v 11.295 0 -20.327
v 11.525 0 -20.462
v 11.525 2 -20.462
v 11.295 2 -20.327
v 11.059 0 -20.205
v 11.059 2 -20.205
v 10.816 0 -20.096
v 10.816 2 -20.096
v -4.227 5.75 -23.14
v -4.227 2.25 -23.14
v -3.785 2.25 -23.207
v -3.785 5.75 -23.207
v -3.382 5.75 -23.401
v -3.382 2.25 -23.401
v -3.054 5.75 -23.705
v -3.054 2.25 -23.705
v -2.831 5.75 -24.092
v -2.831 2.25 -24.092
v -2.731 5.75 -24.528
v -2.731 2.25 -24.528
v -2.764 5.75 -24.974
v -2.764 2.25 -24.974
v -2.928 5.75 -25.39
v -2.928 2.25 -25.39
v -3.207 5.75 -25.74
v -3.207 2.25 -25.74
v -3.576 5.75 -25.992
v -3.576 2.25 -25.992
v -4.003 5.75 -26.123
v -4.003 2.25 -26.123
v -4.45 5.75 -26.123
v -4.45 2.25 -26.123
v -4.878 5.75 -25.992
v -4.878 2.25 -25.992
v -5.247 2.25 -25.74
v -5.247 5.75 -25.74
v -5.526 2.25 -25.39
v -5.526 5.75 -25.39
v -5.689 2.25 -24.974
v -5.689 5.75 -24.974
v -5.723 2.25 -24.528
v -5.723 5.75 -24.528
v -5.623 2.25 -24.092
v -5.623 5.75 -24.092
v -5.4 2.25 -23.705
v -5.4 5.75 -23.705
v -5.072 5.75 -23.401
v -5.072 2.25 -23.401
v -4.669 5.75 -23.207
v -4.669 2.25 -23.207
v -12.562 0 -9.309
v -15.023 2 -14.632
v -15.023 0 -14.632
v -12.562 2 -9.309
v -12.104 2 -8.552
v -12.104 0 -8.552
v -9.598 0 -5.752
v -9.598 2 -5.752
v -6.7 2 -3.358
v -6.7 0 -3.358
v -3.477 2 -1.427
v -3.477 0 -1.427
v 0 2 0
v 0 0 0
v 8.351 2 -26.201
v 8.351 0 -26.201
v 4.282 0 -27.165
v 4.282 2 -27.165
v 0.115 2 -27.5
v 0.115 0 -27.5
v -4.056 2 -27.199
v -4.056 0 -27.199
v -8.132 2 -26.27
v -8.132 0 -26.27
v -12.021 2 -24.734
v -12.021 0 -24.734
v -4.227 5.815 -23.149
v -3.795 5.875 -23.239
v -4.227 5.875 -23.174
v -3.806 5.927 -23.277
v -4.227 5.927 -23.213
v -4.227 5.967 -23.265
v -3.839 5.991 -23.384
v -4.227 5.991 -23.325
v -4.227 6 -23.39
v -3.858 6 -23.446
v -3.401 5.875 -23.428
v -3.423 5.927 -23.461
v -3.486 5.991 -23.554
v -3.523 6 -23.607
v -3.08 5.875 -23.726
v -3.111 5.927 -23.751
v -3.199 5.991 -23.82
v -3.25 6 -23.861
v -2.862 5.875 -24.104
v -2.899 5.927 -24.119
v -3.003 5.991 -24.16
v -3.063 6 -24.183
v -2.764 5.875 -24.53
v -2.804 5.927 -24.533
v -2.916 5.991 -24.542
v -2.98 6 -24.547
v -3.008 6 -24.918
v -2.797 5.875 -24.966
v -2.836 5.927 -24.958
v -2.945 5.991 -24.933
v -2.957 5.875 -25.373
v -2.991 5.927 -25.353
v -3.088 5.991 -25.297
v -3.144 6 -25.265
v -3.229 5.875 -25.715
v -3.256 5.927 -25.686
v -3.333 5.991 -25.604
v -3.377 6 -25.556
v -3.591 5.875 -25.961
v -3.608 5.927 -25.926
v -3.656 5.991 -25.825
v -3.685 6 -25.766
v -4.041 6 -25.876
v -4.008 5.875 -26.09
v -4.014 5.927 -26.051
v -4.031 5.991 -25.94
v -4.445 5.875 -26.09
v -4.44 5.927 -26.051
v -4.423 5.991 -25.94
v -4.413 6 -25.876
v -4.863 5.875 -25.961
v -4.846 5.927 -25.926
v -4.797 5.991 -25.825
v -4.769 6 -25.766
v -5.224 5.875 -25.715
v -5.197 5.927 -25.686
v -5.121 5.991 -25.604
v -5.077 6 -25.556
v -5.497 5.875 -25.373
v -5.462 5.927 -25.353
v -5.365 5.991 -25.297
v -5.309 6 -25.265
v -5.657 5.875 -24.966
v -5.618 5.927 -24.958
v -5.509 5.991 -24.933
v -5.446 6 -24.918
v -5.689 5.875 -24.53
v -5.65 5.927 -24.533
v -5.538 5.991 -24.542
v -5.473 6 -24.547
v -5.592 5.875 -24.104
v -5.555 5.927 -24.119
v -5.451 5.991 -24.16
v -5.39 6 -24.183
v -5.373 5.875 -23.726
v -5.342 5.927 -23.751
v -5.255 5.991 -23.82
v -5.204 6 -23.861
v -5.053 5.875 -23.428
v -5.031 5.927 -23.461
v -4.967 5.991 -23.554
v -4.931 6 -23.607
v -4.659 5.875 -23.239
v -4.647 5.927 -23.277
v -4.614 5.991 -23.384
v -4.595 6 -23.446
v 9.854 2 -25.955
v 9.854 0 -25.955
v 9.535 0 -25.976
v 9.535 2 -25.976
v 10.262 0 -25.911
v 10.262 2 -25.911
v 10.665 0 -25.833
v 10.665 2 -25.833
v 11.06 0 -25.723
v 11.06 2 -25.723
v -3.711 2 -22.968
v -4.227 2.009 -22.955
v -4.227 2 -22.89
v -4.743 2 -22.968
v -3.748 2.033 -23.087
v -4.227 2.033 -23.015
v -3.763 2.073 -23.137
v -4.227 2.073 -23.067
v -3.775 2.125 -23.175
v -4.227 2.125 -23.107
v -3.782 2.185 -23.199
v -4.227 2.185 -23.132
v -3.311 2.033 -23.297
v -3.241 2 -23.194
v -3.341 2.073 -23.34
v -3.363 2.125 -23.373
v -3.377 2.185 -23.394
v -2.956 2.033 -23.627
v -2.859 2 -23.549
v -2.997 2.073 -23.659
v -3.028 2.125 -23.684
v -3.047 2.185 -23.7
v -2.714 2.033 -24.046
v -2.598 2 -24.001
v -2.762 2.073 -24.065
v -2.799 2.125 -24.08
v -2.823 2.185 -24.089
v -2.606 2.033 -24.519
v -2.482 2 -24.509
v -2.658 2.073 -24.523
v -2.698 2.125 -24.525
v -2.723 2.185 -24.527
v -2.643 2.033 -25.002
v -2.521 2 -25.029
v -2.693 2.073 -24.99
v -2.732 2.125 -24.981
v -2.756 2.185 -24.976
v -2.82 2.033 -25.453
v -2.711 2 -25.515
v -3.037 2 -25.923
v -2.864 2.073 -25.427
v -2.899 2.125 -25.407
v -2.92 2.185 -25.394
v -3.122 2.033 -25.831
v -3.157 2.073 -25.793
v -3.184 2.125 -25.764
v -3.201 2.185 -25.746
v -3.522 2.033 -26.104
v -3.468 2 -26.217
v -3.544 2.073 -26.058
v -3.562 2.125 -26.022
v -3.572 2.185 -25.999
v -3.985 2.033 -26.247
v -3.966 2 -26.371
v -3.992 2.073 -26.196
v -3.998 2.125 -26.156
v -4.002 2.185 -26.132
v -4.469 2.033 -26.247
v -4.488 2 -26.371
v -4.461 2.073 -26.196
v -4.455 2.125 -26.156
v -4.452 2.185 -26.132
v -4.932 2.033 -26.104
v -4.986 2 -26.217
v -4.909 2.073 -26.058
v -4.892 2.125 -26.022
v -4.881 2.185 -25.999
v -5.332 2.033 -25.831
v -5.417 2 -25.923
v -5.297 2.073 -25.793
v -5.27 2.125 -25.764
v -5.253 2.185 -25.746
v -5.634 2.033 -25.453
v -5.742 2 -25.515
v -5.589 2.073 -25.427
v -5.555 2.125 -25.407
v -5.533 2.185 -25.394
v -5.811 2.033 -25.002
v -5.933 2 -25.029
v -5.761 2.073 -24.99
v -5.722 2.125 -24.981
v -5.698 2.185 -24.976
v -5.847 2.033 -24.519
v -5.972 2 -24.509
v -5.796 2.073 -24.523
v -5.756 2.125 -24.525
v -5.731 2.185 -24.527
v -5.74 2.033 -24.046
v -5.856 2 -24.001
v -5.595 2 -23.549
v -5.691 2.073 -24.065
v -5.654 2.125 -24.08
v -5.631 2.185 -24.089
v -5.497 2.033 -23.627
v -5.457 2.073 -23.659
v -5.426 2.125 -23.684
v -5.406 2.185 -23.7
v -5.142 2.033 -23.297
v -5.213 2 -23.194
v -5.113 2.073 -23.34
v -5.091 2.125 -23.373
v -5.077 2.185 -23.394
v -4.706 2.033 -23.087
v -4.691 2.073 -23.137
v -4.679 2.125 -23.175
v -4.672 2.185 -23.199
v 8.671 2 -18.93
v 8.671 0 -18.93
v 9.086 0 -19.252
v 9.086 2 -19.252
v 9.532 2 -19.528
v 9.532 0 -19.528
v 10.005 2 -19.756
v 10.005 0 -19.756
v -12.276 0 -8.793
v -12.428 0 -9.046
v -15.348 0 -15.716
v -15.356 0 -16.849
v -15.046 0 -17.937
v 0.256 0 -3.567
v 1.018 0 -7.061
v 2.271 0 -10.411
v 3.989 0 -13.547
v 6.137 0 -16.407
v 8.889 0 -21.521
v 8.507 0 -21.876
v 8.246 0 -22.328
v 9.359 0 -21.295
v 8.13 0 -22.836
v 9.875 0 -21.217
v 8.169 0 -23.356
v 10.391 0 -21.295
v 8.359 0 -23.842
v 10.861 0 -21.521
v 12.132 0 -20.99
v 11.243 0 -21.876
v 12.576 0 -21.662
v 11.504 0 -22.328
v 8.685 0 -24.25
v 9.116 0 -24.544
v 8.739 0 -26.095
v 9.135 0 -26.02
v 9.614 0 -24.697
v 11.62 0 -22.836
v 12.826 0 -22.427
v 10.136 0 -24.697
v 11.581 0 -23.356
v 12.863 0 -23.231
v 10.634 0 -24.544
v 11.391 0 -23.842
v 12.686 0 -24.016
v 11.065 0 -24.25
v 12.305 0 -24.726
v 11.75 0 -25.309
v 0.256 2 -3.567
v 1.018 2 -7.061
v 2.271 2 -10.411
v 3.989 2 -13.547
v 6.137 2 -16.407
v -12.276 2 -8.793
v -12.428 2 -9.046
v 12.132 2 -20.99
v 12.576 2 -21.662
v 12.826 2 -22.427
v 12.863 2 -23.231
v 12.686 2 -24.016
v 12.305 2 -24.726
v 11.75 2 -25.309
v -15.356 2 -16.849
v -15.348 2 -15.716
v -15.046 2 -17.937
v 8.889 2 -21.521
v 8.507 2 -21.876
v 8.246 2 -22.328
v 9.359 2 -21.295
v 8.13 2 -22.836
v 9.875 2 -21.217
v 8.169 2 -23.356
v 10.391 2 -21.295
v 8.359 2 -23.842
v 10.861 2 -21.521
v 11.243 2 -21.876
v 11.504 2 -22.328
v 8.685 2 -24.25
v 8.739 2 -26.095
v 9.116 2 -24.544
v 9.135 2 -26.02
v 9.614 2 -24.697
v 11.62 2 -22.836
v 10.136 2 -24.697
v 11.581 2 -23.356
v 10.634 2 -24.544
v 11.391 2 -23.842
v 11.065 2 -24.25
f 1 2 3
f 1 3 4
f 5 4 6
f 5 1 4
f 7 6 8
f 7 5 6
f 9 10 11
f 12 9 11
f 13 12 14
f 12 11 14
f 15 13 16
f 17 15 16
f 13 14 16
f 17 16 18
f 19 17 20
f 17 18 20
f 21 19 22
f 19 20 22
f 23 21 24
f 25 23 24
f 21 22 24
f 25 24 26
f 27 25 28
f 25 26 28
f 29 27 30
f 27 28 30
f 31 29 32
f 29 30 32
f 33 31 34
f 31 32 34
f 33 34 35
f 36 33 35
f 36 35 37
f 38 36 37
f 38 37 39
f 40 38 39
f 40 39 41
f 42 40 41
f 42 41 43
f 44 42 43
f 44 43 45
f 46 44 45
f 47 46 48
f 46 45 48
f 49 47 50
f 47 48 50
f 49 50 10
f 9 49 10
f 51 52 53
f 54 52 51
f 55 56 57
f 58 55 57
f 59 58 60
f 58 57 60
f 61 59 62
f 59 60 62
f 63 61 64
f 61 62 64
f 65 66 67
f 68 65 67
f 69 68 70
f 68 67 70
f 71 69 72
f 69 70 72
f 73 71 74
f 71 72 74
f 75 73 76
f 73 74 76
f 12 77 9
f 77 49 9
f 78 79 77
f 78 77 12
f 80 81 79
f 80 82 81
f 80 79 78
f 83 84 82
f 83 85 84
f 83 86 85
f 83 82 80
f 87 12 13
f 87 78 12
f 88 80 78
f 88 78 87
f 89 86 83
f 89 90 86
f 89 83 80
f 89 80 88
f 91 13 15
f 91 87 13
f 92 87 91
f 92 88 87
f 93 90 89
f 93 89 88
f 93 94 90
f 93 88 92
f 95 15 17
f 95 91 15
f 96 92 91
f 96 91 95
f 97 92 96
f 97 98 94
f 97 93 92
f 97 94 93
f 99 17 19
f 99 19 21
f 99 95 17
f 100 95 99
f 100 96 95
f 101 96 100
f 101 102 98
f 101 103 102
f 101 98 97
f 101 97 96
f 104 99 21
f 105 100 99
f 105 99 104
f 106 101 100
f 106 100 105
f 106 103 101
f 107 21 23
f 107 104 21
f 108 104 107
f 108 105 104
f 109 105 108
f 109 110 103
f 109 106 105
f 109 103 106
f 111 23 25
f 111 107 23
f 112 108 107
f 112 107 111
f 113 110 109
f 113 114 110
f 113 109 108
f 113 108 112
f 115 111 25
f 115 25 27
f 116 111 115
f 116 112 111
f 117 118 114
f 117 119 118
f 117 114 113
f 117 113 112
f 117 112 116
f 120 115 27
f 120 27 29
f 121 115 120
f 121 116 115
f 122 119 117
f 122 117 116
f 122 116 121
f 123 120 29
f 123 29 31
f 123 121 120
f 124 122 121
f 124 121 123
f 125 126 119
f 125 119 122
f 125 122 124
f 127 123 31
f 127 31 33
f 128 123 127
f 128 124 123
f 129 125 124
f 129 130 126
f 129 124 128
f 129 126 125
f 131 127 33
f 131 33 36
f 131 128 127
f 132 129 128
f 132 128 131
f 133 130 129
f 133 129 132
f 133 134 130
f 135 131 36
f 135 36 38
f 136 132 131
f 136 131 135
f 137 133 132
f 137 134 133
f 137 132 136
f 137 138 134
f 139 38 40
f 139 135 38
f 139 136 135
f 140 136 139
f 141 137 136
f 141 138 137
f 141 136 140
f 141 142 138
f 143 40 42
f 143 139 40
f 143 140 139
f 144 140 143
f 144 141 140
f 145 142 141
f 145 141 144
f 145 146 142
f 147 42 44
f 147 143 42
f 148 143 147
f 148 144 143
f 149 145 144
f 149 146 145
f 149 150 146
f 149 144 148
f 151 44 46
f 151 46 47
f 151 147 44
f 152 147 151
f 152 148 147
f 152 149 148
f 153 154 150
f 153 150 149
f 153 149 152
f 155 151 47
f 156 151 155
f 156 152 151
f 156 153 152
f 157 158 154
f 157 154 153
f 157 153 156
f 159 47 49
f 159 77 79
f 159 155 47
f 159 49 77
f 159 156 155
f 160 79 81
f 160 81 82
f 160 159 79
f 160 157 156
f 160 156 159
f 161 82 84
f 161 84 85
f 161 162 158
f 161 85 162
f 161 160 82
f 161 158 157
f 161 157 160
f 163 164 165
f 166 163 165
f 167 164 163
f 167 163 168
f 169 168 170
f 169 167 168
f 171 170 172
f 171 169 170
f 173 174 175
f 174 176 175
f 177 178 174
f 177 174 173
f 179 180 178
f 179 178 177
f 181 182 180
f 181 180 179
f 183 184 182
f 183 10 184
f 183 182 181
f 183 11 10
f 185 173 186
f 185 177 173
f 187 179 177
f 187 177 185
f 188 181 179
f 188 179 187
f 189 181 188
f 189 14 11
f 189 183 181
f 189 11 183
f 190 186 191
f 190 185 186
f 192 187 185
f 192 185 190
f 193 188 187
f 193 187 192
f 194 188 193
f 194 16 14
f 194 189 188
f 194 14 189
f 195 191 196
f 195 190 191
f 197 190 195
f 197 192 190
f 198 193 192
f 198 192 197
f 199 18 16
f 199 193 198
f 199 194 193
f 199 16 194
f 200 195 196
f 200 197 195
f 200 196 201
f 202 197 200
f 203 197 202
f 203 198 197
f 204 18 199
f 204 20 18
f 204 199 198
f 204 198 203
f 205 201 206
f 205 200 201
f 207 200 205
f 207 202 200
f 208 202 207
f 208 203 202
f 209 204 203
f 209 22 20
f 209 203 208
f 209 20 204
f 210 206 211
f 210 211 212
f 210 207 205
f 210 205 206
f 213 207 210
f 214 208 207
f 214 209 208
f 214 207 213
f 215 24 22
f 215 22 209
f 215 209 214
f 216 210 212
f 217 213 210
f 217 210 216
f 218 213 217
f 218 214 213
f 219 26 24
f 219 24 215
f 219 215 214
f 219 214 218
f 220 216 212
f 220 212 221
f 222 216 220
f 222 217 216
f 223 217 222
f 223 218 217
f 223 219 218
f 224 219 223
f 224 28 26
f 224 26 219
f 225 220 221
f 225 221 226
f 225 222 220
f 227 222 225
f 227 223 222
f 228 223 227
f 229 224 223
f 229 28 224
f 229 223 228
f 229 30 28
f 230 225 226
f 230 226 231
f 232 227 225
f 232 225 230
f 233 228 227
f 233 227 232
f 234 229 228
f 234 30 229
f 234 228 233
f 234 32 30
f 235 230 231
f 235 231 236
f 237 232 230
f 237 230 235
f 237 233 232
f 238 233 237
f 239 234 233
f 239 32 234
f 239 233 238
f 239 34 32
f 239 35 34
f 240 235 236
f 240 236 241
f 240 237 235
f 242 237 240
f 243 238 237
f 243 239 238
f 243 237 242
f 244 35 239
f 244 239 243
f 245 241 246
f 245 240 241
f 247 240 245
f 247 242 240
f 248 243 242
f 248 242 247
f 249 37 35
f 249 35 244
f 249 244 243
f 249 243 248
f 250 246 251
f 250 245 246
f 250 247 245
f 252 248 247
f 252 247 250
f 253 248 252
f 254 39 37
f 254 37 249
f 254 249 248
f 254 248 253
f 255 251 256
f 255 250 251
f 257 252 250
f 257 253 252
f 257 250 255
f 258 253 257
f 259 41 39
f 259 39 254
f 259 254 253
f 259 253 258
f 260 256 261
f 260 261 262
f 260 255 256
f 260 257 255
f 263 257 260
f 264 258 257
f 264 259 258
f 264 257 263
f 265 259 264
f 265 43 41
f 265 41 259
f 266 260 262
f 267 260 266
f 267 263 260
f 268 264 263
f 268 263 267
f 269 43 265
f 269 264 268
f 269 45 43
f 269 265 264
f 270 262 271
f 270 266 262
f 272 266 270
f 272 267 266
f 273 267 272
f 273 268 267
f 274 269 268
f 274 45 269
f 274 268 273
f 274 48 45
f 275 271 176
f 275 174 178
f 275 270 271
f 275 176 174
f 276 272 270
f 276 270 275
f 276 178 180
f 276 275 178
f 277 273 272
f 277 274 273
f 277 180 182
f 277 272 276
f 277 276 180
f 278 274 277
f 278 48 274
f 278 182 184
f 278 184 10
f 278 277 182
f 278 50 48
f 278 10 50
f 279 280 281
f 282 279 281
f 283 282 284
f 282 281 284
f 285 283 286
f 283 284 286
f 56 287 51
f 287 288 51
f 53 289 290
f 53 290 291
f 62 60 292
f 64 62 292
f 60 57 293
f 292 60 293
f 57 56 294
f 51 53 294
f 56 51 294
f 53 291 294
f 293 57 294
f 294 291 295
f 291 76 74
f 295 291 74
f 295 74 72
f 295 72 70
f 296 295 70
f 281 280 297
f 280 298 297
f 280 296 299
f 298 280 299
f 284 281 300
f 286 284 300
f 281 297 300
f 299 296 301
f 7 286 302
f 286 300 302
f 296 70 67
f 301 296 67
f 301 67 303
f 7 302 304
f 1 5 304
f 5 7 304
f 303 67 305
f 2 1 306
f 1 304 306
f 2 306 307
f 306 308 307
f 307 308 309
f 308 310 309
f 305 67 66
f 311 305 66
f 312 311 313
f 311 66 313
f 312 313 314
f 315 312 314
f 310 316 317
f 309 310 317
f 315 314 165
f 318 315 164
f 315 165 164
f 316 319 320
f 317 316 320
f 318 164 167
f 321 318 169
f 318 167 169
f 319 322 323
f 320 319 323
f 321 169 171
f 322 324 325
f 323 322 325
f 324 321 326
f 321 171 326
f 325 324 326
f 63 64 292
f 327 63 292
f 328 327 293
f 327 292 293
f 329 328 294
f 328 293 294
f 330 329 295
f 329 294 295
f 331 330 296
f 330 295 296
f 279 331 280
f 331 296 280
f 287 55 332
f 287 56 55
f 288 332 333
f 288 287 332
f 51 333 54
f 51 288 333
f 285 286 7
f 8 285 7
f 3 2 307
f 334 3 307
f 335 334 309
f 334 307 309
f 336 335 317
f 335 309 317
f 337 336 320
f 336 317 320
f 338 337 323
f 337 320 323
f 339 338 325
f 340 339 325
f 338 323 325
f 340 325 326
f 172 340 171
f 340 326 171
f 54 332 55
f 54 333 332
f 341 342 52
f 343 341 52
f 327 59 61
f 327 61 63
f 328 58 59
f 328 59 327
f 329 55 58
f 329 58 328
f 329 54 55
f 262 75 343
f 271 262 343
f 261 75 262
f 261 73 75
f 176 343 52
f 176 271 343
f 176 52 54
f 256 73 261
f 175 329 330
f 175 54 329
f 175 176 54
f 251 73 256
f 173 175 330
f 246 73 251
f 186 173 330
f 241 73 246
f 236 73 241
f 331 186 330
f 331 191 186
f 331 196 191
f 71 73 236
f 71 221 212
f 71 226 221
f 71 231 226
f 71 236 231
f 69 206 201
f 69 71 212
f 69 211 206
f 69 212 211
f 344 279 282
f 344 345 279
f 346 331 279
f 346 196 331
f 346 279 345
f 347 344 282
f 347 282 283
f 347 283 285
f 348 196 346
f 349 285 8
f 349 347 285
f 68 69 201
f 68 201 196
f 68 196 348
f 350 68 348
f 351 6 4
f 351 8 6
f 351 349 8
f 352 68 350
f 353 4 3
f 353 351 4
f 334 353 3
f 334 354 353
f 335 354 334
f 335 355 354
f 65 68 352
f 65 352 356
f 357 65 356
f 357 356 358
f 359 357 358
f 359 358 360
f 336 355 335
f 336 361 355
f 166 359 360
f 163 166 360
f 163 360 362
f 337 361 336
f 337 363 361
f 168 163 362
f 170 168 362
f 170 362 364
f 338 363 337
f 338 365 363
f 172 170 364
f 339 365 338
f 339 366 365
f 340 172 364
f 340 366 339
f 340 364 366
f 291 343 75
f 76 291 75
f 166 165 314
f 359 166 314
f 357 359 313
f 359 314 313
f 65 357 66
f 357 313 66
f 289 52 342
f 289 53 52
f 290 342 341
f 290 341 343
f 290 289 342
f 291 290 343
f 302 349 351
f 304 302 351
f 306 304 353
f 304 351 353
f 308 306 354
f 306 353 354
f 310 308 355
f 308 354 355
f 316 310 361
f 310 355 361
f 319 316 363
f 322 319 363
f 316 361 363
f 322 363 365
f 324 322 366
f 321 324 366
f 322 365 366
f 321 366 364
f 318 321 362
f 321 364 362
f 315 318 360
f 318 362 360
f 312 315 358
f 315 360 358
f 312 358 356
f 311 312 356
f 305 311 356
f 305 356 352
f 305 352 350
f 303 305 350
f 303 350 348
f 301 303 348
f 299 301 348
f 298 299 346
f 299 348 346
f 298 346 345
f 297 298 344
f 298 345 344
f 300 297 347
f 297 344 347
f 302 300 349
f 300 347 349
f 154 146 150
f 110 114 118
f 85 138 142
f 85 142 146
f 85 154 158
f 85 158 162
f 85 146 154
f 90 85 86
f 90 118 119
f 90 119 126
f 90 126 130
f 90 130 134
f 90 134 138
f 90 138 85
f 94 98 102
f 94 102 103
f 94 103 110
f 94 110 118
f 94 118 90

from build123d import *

# Parameters (mm, degrees)
BOSS_EXTRUDE1_DEPTH = 2
FILLET1_R           = 2.5
SKETCH2_R           = 1.5
SKETCH2_R_2         = 1.75
CUT_EXTRUDE1_DEPTH  = 2
CUT_EXTRUDE2_REACH  = 34.399
BOSS_EXTRUDE2_START = -2
SKETCH6_R           = 1.5
BOSS_EXTRUDE2_DEPTH = 2
BOSS_EXTRUDE3_START = -2
BOSS_EXTRUDE3_DEPTH = 2
FILLET2_START       = -1
FILLET2_DEPTH       = 4
FILLET2_2_DEPTH     = 2
CUT_EXTRUDE3_DEPTH  = 2
FILLET3_R           = 4
SKETCH11_R          = 1.5
BOSS_EXTRUDE4_DEPTH = 4
FILLET6_R           = 0.25


with BuildPart() as part:
    # Sketch1 → Boss-Extrude1 (new body)
    with BuildSketch(Plane(origin=(0, 0, 0), x_dir=(1, 0, 0), z_dir=(0, 1, 0))):
        with BuildLine():
            ThreePointArc((15.125, 22.967027997), (-1.263298306, 27.470967901), (-17.169059596, 21.48193177))
            ThreePointArc((-17.169059596, 21.48193177), (-11.803604023, 8.168176911), (0, 0))
            ThreePointArc((0, 0), (4.120883639, 13.75), (15.125, 22.967027997))
        make_face()
    extrude(amount=BOSS_EXTRUDE1_DEPTH)

    # Fillet1
    fillet1_edges = [part.edges().sort_by_distance(p)[0] for p in [
        (-17.169059596, 1, -21.48193177),
        (15.125, 1, -22.967027997),
    ]]
    fillet(fillet1_edges, radius=FILLET1_R)

    # Sketch2 → Cut-Extrude1 (cut)
    with BuildSketch(Plane(origin=(0, 2, 0), x_dir=(1, 0, 0), z_dir=(0, 1, 0))):
        with Locations(Location((-4.226868107, 24.640080885, 0), (0, 0, 270))):
            Circle(SKETCH2_R)
        with Locations(Location((9.875, 22.967027997, 0), (0, 0, 270))):
            Circle(SKETCH2_R_2)
    extrude(amount=-CUT_EXTRUDE1_DEPTH, mode=Mode.SUBTRACT)

    # Sketch3 → Cut-Extrude2 (cut, up to next)
    with BuildSketch(Plane(origin=(0, 2, 0), x_dir=(1, 0, 0), z_dir=(0, 1, 0)), mode=Mode.PRIVATE) as cut_extrude2_sk1:
        with BuildLine():
            Line((-15.980917027, 15.838569726), (-12.020745702, 24.733614228))
            ThreePointArc((-12.020745702, 24.733614228), (-14.04148027, 23.645017061), (-15.964394934, 22.391696997))
            ThreePointArc((-15.964394934, 22.391696997), (-16.816313344, 21.328273965), (-16.984031989, 19.976052098))
            ThreePointArc((-16.984031989, 19.976052098), (-16.570708205, 17.885919028), (-15.980917027, 15.838569726))
        make_face()
    cut_extrude2_tool1 = extrude(cut_extrude2_sk1.sketch, amount=-CUT_EXTRUDE2_REACH, mode=Mode.PRIVATE) & part.part
    add(cut_extrude2_tool1.solids().sort_by_distance((-15.061244, 2, -20.693622))[0], mode=Mode.SUBTRACT)

    # Sketch6 → Boss-Extrude2 (add)
    with BuildSketch(Plane.XZ.offset(BOSS_EXTRUDE2_START)):
        with Locations((-4.226868107, -24.640080885)):
            Circle(SKETCH6_R)
    extrude(amount=BOSS_EXTRUDE2_DEPTH)

    # Sketch7 → Boss-Extrude3 (add)
    with BuildSketch(Plane(origin=(0, 2, 0), x_dir=(1, 0, 0), z_dir=(0, 1, 0)).offset(BOSS_EXTRUDE3_START)):
        with BuildLine():
            Line((9.313984882, 19.466610638), (11.248778971, 20.27693074))
            ThreePointArc((11.248778971, 20.27693074), (11.386576571, 20.3697006), (11.525, 20.461534033))
            ThreePointArc((11.525, 20.461534033), (12.863352389, 23.23113025), (11.06, 25.723071356))
            ThreePointArc((11.06, 25.723071356), (10.846265511, 25.813921137), (10.631784841, 25.902995022))
            Line((10.631784841, 25.902995022), (8.903638019, 26.018747665))
            ThreePointArc((8.903638019, 26.018747665), (9.890276319, 25.659938315), (10.8625, 25.263730796))
            ThreePointArc((10.8625, 25.263730796), (12.365293657, 23.187113207), (11.25, 20.879116361))
            ThreePointArc((11.25, 20.879116361), (10.26505719, 20.196075371), (9.313984882, 19.466610638))
        make_face()
    extrude(amount=BOSS_EXTRUDE3_DEPTH)

    # Fillet2: read off the stored shape, not the designer's step
    # Fillet2 outline → Fillet2 (cut)
    with BuildSketch(Plane(origin=(0, 0, 0), x_dir=(1, 0, 0), z_dir=(0, 1, 0)).offset(FILLET2_START)):
        with BuildLine():
            ThreePointArc((11.525, 20.461534033), (11.178047435, 20.264564275), (10.816495082, 20.095883915))
            Line((10.816495082, 20.095883915), (11.248778971, 20.27693074))
            ThreePointArc((11.248778971, 20.27693074), (11.386576571, 20.3697006), (11.525, 20.461534033))
        make_face()
        with BuildLine():
            Line((10.631784841, 25.902995022), (9.853687309, 25.955112611))
            ThreePointArc((9.853687309, 25.955112611), (10.463996888, 25.876279494), (11.06, 25.723071356))
            ThreePointArc((11.06, 25.723071356), (10.846265511, 25.813921137), (10.631784841, 25.902995022))
        make_face()
    extrude(amount=FILLET2_DEPTH, mode=Mode.SUBTRACT)

    # Fillet2 2 outline → Fillet2 2 (add)
    with BuildSketch(Plane(origin=(0, 0, 0), x_dir=(1, 0, 0), z_dir=(0, 1, 0))):
        with BuildLine():
            ThreePointArc((9.313984882, 19.466610638), (8.990075455, 19.201101949), (8.670659365, 18.930204289))
            ThreePointArc((8.670659365, 18.930204289), (9.30523679, 19.395787738), (10.005013016, 19.756023341))
            Line((10.005013016, 19.756023341), (9.313984882, 19.466610638))
        make_face()
        with BuildLine():
            Line((8.903638019, 26.018747665), (9.535077314, 25.97645336))
            ThreePointArc((9.535077314, 25.97645336), (8.936180246, 26.053104962), (8.350889065, 26.201386448))
            ThreePointArc((8.350889065, 26.201386448), (8.627746835, 26.111529725), (8.903638019, 26.018747665))
        make_face()
    extrude(amount=FILLET2_2_DEPTH)

    # Sketch8 → Cut-Extrude3 (cut)
    with BuildSketch(Plane(origin=(0, 2, 0), x_dir=(1, 0, 0), z_dir=(0, 1, 0))):
        Polygon((-17.225521171, 19.396093794), (-10.650323335, 5.173654997), (-21.381773126, 15.240189751), align=None)
    extrude(amount=-CUT_EXTRUDE3_DEPTH, mode=Mode.SUBTRACT)

    # Fillet3
    fillet3_edges = [part.edges().sort_by_distance(p)[0] for p in [
        (-15.784646242, 1, -16.279418676),
        (-12.383702581, 1, -8.923029671),
    ]]
    fillet(fillet3_edges, radius=FILLET3_R)

    # Sketch11 → Boss-Extrude4 (add)
    with BuildSketch(Plane(origin=(0, 2, 0), x_dir=(1, 0, 0), z_dir=(0, 1, 0))):
        with Locations(Location((-4.226868107, 24.640080885, 0), (0, 0, 270))):
            Circle(SKETCH11_R)
    extrude(amount=BOSS_EXTRUDE4_DEPTH)

    # Fillet6
    fillet6_edges = [part.edges().sort_by_distance(p)[0] for p in [
        (-4.226868107, 2, -26.140080885),
        (-4.226868107, 6, -26.140080885),
    ]]
    fillet(fillet6_edges, radius=FILLET6_R)


solid = part.part
